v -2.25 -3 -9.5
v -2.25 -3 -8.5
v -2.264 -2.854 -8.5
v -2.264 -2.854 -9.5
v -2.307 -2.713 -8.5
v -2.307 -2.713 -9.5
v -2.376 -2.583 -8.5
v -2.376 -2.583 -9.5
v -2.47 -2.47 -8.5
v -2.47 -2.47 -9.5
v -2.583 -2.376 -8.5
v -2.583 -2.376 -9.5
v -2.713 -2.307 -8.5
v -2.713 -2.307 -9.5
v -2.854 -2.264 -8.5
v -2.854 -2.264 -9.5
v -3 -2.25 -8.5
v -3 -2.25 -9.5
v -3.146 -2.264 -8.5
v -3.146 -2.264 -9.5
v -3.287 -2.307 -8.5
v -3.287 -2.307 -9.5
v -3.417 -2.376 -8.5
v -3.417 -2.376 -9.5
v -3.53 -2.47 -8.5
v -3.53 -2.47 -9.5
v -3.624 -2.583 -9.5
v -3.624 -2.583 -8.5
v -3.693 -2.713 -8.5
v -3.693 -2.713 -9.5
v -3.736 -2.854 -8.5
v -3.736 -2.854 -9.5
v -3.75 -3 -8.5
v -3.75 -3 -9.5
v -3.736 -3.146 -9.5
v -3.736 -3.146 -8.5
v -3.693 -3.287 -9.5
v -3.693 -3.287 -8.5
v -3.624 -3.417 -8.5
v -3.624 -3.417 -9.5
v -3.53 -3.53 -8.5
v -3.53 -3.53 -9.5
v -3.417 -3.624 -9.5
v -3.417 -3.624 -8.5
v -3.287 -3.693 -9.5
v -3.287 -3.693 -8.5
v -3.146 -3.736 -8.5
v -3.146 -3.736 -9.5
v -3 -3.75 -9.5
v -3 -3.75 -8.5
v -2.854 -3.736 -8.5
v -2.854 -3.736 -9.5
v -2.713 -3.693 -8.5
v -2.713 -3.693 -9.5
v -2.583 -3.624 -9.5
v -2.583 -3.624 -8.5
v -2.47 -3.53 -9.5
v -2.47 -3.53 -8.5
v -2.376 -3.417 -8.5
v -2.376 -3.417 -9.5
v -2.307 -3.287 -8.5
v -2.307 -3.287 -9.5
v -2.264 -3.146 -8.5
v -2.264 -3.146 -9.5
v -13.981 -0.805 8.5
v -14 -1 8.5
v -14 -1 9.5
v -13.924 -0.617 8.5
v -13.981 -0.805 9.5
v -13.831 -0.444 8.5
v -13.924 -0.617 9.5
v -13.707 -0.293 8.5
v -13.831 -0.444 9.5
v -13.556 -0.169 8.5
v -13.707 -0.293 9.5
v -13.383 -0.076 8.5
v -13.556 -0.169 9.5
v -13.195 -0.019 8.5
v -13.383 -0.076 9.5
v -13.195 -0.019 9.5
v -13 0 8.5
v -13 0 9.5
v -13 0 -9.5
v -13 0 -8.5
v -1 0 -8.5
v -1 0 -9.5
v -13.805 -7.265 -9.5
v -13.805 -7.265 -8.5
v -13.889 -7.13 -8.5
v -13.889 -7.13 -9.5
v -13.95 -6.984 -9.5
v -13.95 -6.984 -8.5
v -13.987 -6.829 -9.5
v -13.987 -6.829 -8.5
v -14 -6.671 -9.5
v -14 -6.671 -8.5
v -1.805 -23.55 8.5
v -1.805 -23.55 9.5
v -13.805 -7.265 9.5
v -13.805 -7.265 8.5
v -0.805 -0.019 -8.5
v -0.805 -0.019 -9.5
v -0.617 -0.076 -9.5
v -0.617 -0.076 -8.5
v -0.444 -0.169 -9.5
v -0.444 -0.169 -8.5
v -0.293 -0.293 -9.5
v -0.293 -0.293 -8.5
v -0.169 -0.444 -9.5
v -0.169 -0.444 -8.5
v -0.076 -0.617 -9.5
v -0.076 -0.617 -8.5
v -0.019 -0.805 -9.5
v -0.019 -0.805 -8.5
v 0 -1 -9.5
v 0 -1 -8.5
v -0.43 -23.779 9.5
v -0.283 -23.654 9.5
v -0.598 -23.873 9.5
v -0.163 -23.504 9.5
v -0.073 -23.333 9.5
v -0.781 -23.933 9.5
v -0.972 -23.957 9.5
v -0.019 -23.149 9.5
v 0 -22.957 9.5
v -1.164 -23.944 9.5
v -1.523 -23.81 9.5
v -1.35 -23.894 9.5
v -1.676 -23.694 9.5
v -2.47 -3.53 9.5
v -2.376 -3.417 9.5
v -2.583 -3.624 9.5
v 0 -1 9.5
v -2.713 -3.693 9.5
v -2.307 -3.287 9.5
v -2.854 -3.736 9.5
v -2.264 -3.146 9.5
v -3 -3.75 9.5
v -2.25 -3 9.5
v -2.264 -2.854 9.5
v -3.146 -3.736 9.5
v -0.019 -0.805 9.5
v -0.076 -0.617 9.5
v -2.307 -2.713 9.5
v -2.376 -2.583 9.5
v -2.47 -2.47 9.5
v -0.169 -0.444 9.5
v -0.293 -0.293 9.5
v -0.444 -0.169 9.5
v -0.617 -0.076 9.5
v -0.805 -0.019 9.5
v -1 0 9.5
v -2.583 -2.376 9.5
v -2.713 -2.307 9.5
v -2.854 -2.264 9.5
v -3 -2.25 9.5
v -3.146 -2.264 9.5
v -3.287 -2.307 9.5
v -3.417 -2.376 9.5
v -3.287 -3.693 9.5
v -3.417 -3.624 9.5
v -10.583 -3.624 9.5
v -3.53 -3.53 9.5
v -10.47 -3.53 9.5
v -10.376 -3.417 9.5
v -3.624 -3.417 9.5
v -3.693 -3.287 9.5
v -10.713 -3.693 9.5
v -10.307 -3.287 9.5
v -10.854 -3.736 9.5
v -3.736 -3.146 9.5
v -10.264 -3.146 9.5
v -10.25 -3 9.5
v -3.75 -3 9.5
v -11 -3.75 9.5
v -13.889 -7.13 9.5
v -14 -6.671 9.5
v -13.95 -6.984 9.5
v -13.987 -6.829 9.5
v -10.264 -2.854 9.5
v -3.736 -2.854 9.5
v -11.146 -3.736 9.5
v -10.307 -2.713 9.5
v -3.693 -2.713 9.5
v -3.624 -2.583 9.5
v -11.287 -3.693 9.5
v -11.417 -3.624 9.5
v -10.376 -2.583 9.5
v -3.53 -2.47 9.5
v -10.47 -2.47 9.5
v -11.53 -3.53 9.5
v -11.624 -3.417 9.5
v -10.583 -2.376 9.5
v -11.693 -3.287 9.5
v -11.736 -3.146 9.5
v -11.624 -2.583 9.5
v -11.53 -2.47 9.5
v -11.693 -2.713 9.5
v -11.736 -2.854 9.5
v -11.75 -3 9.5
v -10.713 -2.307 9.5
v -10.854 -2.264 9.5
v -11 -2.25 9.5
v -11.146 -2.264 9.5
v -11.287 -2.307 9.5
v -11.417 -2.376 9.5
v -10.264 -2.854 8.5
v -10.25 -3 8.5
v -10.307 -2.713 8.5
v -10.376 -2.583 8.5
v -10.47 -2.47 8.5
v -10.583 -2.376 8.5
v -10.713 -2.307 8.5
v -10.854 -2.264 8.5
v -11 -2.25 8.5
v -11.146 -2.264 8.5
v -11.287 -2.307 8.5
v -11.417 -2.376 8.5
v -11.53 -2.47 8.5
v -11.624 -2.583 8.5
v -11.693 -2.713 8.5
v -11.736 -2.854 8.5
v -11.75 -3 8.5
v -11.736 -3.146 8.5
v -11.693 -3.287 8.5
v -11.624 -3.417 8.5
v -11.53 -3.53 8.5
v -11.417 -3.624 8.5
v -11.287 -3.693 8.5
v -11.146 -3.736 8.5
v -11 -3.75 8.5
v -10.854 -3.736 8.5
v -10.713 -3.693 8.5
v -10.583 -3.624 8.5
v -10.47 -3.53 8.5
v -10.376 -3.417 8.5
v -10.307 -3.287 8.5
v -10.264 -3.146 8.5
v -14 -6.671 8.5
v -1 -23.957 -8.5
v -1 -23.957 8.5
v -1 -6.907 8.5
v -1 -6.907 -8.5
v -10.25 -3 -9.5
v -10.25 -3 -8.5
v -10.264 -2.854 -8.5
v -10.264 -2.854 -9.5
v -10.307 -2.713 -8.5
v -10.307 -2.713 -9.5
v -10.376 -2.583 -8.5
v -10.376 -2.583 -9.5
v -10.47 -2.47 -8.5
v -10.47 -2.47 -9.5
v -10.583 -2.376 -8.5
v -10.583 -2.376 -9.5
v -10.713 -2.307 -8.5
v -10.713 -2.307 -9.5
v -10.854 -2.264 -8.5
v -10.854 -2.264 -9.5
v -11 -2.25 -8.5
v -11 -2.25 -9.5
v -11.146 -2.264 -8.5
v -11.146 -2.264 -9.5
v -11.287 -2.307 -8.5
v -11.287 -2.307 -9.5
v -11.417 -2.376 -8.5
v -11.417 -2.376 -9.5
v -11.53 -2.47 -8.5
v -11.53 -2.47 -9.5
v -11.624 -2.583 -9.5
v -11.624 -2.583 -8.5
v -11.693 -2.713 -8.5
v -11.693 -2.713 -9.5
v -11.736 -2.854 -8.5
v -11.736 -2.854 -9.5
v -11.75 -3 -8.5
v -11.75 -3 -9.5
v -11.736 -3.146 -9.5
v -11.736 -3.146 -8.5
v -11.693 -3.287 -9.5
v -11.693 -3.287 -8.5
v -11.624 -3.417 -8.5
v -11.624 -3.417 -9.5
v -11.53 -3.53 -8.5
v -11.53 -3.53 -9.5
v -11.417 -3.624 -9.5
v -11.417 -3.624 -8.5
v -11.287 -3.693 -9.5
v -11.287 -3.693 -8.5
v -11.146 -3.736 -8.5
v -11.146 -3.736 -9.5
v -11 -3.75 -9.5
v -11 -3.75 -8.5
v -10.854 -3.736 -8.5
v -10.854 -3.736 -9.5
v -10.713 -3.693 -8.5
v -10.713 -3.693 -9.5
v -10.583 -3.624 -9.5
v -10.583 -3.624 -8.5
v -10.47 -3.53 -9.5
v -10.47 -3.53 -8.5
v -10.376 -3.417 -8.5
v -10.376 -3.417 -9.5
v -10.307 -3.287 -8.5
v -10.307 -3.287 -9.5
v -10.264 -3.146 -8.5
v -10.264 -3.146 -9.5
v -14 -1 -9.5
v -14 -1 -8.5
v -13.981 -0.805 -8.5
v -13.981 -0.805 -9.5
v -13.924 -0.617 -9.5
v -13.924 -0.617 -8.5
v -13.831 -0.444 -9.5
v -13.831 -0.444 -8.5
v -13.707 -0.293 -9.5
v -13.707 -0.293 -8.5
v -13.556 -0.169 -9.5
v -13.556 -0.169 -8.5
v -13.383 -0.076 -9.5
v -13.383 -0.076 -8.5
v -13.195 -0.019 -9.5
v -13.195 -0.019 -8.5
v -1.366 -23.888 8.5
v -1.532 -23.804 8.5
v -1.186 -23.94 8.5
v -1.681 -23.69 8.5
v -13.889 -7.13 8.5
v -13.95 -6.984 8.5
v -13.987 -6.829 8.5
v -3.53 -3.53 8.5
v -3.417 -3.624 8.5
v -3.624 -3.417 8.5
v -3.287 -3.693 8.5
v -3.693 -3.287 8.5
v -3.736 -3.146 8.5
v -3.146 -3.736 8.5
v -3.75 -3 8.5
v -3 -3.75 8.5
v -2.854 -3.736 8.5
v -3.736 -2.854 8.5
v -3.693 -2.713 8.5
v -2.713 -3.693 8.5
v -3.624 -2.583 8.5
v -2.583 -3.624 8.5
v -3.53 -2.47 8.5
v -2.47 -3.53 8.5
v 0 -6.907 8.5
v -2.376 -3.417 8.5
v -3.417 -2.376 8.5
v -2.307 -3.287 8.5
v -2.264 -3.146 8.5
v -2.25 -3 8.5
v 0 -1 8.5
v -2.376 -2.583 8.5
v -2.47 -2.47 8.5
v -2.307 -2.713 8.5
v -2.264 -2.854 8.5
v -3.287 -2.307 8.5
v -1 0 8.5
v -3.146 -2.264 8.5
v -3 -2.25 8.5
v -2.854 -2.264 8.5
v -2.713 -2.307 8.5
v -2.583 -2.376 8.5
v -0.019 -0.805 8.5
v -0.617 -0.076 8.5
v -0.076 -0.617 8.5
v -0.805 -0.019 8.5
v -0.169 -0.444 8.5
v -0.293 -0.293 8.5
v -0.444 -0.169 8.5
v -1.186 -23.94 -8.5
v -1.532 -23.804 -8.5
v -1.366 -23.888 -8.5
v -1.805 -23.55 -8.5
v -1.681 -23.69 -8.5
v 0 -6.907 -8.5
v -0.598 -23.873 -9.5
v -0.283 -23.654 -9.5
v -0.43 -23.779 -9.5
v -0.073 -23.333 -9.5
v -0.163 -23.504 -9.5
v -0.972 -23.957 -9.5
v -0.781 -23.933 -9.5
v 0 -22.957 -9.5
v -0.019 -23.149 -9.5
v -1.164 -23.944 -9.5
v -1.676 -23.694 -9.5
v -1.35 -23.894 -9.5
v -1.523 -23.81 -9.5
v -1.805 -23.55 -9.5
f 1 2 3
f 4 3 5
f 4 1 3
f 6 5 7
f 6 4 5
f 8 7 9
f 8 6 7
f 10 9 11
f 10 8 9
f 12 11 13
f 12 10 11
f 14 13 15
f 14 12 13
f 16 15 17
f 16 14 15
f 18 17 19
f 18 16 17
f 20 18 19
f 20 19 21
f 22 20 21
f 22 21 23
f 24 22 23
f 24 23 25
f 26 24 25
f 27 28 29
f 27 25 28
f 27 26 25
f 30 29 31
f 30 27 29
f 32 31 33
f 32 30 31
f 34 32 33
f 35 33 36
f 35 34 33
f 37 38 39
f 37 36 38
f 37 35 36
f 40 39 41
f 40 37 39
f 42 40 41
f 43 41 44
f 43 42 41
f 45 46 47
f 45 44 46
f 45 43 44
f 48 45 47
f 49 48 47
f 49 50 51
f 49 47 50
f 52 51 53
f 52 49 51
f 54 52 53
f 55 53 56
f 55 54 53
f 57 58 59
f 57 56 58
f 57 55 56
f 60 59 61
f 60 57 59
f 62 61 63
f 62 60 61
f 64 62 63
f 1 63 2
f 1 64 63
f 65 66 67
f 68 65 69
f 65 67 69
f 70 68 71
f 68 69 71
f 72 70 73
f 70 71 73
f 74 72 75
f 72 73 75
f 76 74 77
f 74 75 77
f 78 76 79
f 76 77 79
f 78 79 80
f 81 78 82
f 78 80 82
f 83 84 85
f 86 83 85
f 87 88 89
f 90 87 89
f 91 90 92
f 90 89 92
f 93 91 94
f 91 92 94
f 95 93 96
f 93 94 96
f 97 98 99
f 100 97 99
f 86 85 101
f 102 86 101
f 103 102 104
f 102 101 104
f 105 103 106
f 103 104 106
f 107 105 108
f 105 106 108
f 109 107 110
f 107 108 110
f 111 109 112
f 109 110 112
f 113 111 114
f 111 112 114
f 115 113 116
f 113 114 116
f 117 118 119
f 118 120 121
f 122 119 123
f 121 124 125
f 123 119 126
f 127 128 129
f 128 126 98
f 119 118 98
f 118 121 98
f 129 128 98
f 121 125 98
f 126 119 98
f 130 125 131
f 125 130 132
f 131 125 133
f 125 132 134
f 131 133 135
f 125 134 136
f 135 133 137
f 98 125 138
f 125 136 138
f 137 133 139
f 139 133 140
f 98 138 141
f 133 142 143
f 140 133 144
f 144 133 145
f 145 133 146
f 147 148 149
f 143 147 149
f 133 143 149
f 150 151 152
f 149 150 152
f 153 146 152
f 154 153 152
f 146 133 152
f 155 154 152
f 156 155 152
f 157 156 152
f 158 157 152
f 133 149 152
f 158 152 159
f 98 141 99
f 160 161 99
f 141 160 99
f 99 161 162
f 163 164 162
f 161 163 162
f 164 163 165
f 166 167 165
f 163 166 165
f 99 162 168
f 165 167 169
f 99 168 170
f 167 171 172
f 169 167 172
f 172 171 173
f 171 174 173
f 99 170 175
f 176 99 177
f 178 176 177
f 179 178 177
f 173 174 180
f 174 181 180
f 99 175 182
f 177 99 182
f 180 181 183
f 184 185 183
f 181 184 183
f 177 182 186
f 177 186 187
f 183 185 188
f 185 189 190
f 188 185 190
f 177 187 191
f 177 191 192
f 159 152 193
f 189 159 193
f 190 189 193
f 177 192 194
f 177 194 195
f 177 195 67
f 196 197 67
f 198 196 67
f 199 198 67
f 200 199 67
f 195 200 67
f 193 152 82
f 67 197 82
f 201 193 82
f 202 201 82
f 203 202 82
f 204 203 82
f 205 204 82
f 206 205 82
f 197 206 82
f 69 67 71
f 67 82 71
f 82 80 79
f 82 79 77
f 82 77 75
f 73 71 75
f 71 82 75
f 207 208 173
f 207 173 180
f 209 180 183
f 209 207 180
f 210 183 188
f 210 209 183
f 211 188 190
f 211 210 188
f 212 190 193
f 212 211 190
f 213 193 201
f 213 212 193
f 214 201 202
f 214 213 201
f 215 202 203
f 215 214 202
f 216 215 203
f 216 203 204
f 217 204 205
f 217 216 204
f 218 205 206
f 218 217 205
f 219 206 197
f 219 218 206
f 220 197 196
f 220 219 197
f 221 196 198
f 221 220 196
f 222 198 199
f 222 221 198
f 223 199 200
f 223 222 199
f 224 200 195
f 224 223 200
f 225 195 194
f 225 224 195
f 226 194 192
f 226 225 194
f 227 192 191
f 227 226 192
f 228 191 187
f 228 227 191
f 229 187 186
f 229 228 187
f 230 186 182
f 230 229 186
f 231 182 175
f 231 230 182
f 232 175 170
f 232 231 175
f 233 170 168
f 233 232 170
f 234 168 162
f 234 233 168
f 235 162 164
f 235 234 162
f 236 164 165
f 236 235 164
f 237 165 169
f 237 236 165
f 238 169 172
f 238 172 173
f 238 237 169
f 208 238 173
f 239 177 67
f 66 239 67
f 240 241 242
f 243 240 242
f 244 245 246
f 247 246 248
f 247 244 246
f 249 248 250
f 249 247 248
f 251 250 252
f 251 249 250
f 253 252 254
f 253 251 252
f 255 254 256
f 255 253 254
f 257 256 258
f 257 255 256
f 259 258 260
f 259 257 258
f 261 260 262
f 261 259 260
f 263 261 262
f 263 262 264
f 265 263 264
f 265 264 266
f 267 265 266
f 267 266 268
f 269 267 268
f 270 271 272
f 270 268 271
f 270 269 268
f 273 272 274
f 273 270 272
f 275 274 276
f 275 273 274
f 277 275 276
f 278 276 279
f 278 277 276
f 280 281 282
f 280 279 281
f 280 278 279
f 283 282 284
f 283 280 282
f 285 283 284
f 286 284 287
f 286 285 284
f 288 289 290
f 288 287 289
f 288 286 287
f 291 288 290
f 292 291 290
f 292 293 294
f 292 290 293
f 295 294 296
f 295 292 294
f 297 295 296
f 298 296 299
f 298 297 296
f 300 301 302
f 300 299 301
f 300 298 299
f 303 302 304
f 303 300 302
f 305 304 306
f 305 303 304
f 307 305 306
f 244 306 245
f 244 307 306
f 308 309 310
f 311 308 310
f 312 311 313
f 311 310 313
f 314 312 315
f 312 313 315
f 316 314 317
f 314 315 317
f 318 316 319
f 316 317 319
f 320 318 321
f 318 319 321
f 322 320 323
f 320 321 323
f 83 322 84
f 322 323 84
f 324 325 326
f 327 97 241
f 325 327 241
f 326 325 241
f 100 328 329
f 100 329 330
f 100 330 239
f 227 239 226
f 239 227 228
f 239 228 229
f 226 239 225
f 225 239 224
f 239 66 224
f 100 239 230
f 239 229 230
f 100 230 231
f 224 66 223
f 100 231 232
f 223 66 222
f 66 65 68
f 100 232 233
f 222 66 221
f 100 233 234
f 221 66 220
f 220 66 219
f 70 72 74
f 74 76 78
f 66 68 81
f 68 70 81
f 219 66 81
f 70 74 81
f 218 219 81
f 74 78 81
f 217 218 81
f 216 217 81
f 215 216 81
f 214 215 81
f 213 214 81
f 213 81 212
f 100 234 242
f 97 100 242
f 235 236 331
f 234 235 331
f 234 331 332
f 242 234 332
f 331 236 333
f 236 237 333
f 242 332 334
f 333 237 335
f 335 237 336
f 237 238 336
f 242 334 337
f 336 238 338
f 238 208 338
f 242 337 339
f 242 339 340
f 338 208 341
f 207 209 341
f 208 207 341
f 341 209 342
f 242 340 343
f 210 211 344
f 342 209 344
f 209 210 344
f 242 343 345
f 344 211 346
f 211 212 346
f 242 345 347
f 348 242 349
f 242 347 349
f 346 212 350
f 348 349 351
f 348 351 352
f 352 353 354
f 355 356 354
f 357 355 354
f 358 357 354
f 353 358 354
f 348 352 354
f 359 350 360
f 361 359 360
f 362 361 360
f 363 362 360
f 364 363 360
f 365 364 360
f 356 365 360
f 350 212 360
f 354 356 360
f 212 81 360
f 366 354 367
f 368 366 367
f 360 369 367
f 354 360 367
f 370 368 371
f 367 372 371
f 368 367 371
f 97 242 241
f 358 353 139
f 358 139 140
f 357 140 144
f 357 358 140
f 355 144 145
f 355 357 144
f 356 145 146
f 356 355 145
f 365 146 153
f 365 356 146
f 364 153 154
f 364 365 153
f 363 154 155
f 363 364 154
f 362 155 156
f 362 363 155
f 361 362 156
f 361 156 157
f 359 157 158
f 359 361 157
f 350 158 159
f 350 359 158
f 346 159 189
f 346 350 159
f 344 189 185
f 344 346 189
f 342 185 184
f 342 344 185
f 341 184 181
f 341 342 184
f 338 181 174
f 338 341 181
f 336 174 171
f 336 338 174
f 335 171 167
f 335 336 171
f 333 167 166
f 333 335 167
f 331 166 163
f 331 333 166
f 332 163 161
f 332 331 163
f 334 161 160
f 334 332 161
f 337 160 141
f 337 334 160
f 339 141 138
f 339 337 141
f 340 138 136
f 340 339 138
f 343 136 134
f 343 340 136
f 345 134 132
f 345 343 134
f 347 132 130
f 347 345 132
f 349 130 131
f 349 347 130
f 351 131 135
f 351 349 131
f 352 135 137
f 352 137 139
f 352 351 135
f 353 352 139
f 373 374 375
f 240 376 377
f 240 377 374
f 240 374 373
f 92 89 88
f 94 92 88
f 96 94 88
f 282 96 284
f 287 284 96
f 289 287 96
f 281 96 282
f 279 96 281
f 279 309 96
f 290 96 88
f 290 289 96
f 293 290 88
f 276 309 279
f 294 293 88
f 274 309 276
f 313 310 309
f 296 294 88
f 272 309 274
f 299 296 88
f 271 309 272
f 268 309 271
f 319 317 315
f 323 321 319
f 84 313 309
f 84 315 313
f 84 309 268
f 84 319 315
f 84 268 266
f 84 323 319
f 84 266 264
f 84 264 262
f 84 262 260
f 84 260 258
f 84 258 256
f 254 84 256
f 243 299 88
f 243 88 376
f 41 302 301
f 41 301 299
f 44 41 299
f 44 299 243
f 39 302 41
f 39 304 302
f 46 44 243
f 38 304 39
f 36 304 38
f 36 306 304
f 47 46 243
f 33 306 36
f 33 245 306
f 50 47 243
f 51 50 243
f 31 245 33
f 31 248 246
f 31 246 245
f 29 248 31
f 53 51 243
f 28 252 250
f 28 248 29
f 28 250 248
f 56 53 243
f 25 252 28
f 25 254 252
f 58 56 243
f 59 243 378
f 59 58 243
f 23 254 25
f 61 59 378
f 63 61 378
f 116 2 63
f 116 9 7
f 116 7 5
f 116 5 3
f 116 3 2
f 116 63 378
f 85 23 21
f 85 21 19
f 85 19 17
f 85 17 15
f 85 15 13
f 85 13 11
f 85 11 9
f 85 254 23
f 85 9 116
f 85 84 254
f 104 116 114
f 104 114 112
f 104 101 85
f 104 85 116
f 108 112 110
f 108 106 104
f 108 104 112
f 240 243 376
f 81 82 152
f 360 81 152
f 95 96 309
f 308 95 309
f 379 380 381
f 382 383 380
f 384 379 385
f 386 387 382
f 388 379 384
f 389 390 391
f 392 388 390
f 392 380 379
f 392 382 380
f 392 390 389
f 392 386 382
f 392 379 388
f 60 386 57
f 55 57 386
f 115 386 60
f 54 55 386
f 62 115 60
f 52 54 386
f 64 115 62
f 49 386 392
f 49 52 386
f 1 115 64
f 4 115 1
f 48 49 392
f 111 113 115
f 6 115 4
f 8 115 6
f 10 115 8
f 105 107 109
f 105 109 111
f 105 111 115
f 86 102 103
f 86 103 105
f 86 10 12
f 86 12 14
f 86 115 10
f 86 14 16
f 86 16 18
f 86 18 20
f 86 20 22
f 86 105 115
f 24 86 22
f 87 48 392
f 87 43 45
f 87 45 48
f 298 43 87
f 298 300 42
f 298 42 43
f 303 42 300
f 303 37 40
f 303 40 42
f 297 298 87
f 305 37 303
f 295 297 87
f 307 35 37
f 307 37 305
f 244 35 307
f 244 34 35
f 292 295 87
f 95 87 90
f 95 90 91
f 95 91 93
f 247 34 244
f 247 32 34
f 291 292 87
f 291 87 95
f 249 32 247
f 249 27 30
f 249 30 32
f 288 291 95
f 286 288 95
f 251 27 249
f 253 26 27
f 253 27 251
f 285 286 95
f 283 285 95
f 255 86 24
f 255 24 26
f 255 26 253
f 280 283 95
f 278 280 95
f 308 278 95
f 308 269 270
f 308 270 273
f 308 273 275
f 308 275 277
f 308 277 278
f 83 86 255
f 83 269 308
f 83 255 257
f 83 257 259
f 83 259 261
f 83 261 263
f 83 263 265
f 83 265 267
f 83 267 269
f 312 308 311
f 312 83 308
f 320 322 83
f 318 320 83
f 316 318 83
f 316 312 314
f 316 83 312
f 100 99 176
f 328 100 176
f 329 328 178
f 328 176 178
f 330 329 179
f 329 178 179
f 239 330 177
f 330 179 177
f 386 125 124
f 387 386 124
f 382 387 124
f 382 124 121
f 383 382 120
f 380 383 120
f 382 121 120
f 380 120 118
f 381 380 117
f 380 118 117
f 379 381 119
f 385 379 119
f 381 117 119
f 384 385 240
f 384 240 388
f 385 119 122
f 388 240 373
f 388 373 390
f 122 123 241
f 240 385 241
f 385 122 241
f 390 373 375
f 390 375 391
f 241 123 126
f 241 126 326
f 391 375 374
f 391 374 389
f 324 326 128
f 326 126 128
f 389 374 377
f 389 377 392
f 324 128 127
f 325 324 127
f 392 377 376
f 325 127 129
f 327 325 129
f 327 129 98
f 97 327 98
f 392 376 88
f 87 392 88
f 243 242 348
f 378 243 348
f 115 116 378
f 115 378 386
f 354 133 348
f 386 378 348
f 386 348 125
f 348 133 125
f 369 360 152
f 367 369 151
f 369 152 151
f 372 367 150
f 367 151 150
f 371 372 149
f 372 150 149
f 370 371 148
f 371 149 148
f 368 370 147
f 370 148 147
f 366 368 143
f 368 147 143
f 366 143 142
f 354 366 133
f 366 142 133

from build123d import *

# Parameters (mm, degrees)
SKETCH1_R           = 0.75
BOSS_EXTRUDE1_DEPTH = 9.5
CUT_EXTRUDE1_DEPTH  = 8.5


with BuildPart() as part:
    # Sketch1 → Boss-Extrude1 (new, symmetric)
    with BuildSketch(Plane.XY):
        with BuildLine():
            Line((0, -1), (0, -22.957082326))
            ThreePointArc((0, -22.957082326), (-0.687794809, -23.907097019), (-1.805055837, -23.550281364))
            Line((-1.805055837, -23.550281364), (-13.805055837, -7.264567078))
            ThreePointArc((-13.805055837, -7.264567078), (-13.950014694, -6.983573231), (-14, -6.67136804))
            Line((-14, -6.67136804), (-14, -1))
            ThreePointArc((-14, -1), (-13.707106781, -0.292893219), (-13, 0))
            Line((-13, 0), (-1, 0))
            ThreePointArc((-1, 0), (-0.292893219, -0.292893219), (0, -1))
        make_face()
        with Locations((-11, -3)):
            Circle(SKETCH1_R, mode=Mode.SUBTRACT)
        with Locations((-3, -3)):
            Circle(SKETCH1_R, mode=Mode.SUBTRACT)
    extrude(amount=BOSS_EXTRUDE1_DEPTH, both=True)

    # Sketch2 → Cut-Extrude1 (cut, symmetric)
    with BuildSketch(Plane.XY):
        Polygon((-1, -28.348579048), (-1, -6.907097019), (7.926418822, -6.907097019), (7.294916487, 4.746991522), (-21.667349138, 6.871135739), (-20.03469418, -23.258769395), align=None)
    extrude(amount=CUT_EXTRUDE1_DEPTH, both=True, mode=Mode.SUBTRACT)


solid = part.part
